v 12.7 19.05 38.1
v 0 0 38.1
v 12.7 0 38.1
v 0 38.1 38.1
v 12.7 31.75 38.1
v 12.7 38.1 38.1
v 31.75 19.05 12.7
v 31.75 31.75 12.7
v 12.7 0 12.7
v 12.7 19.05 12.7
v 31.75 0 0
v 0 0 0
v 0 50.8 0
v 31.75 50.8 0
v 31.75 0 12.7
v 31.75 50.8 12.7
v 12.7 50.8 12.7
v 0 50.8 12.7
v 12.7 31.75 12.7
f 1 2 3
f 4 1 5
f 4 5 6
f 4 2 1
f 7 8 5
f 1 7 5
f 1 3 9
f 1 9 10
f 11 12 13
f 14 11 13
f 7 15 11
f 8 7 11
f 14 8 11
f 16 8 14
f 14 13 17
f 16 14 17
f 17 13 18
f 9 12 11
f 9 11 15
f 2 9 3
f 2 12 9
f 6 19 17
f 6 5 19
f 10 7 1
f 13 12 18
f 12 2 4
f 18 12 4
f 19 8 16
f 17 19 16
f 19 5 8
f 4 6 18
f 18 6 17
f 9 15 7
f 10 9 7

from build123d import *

# Parameters (mm, degrees)
F0_W     = 50.8
F0_H     = 38.1
F1_DEPTH = 31.75
F3_DEPTH = 31.75
F5_DEPTH = 19.05
F7_DEPTH = 12.7
F8_W     = 19.05
F8_H     = 25.4
F9_DEPTH = 19.05


with BuildPart() as f1:
    # F0 (on Right) → F1 (new body)
    with BuildSketch(Plane.YZ):
        with Locations((25.4, 19.05)):
            Rectangle(F0_W, F0_H)
    extrude(amount=F1_DEPTH)

    # F2 (on face) → F3 (cut)
    with BuildSketch(Plane.YZ.offset(31.75)):
        Polygon((50.8, 12.7), (50.8, 38.1), (38.1, 38.1), align=None)
    extrude(amount=-F3_DEPTH, mode=Mode.SUBTRACT)

    # F4 (on face) → F5 (cut)
    with BuildSketch(Plane.YZ.offset(31.75)):
        Polygon((31.75, 12.7), (50.8, 12.7), (38.1, 38.1), (31.75, 38.1), align=None)
    extrude(amount=-F5_DEPTH, mode=Mode.SUBTRACT)

    # F6 (on face) → F7 (cut)
    with BuildSketch(Plane(origin=(0, 31.75, 0), x_dir=(-1, 0, 0), z_dir=(0, 1, 0))):
        Polygon((-31.75, 38.1), (-31.75, 12.7), (-12.7, 38.1), align=None)
    extrude(amount=-F7_DEPTH, mode=Mode.SUBTRACT)

    # F8 (on face) → F9 (cut)
    with BuildSketch(Plane.YZ.offset(31.75)):
        with Locations((9.525, 25.4)):
            Rectangle(F8_W, F8_H)
    extrude(amount=-F9_DEPTH, mode=Mode.SUBTRACT)


solid = f1.part
